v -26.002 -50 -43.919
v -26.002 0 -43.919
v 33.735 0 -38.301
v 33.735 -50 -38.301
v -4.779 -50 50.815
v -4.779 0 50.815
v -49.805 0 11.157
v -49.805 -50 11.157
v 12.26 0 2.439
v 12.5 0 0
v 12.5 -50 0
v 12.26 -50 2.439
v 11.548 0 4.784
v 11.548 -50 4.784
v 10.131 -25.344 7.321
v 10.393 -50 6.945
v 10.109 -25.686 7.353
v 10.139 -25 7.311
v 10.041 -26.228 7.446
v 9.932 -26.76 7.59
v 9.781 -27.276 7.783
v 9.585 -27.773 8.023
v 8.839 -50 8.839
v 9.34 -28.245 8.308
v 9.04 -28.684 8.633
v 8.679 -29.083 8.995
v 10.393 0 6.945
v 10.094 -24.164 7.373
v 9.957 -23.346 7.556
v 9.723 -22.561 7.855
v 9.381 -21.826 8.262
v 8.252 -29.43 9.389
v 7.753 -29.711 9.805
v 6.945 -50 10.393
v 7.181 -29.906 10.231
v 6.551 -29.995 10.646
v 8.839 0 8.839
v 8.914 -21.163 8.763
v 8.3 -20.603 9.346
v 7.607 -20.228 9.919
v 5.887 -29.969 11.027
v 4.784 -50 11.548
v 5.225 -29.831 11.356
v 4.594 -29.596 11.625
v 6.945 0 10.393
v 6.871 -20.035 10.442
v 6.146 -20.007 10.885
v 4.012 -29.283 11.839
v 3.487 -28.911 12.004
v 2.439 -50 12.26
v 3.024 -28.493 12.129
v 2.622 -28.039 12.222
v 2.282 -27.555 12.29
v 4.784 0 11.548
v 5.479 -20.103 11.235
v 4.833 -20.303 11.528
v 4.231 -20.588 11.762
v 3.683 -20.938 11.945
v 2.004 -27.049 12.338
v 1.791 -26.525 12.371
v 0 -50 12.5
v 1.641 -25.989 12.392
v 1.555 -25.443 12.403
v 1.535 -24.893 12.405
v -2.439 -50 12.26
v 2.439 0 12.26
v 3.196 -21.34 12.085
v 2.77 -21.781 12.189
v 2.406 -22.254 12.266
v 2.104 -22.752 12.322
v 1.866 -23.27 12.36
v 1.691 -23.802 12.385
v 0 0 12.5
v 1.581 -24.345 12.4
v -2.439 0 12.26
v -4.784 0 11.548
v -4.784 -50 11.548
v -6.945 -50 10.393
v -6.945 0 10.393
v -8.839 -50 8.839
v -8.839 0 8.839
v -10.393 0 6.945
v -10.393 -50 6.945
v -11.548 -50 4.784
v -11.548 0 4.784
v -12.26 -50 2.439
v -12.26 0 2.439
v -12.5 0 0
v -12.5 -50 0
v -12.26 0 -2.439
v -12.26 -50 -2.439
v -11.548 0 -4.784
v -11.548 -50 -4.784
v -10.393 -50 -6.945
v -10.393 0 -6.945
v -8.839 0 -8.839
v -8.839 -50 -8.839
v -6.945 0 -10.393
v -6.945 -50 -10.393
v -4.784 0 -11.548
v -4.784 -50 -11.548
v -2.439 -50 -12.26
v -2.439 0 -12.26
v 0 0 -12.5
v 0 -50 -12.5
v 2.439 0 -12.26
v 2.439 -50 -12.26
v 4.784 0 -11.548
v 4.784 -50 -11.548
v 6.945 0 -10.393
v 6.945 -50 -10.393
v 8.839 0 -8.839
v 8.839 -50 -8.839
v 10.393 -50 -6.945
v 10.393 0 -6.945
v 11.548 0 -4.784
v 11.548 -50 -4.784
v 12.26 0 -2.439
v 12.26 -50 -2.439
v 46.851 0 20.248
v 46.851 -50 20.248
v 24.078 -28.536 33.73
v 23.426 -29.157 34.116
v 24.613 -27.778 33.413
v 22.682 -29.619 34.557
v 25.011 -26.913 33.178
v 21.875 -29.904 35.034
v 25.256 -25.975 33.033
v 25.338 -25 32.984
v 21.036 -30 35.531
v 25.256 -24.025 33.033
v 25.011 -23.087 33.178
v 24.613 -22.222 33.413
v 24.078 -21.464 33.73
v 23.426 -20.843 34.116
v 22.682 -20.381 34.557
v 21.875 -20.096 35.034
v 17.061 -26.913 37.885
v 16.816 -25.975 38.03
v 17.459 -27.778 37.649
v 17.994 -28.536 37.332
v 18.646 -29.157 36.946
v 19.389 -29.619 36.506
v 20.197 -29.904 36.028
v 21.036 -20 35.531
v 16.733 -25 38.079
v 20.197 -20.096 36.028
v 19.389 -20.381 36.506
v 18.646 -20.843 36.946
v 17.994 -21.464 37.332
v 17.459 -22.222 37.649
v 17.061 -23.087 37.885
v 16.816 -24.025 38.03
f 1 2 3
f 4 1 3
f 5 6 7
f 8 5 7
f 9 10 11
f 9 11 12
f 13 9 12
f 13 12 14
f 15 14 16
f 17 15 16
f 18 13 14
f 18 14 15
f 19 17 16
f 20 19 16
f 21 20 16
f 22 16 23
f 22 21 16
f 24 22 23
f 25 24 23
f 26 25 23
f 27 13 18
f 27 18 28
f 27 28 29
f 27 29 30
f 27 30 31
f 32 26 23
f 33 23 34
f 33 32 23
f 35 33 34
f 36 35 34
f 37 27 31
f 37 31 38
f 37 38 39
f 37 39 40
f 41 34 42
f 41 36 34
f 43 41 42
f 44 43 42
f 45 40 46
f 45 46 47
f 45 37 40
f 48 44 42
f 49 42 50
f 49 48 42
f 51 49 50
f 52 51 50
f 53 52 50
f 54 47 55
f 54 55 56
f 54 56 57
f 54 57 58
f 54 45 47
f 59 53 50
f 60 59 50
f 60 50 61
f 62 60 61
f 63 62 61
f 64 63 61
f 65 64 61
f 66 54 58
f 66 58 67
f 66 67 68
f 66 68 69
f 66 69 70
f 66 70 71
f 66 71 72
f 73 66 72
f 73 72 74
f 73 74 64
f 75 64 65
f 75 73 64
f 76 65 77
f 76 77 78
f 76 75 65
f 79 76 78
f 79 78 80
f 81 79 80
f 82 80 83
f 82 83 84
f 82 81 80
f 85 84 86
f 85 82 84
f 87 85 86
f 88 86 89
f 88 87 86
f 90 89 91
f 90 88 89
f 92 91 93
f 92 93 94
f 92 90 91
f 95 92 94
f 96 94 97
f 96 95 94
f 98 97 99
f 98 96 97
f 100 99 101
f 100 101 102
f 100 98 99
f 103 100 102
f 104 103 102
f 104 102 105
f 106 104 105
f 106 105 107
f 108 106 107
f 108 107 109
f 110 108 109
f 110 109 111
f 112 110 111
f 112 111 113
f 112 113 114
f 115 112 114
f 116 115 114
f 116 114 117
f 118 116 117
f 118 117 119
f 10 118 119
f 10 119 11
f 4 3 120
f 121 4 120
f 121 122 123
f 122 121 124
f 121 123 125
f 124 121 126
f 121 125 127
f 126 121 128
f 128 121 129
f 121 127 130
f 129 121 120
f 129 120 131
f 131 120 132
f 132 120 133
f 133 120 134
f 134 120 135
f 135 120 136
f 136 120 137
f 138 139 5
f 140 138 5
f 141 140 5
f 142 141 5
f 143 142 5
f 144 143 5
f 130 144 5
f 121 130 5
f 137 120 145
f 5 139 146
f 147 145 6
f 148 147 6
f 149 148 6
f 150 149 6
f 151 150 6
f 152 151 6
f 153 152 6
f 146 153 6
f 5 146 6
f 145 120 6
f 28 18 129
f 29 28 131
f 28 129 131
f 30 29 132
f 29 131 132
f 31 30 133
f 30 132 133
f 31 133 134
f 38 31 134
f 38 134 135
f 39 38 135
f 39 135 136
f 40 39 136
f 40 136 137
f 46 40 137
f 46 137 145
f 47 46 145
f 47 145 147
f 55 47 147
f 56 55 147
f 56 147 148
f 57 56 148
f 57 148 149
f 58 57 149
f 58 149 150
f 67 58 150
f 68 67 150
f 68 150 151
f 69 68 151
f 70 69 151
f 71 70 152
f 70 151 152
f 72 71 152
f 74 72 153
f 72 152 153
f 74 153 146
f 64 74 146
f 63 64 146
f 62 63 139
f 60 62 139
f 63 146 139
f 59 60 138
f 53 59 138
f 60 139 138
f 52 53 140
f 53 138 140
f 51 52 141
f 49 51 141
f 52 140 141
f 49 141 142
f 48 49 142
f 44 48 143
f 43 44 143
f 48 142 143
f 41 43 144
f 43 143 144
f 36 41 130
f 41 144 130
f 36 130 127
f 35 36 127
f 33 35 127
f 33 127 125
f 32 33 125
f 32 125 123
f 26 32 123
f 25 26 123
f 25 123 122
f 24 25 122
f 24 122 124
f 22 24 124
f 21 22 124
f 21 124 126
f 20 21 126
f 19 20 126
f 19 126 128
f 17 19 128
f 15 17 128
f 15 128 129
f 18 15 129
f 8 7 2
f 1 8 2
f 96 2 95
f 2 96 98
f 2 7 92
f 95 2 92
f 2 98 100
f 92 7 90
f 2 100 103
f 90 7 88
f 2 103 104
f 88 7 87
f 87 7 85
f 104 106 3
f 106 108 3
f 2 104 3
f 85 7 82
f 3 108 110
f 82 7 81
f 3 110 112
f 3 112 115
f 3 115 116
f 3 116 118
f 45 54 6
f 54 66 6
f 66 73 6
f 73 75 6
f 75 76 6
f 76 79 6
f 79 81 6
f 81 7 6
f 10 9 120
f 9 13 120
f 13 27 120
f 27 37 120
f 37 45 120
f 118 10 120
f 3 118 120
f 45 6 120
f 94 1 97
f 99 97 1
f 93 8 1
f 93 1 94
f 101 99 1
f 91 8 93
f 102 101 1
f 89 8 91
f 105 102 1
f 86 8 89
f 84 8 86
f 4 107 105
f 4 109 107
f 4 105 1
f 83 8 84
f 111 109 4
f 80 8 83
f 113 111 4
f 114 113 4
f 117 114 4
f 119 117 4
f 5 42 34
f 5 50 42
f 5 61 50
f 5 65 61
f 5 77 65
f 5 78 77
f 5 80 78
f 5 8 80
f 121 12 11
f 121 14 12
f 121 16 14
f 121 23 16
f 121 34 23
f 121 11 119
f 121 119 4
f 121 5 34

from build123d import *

# Parameters (mm, degrees)
F0_R     = 12.5
F1_DEPTH = 50
F2_R     = 5
F3_DEPTH = 29.8360184767


with BuildPart() as f1:
    # F0 (on Front) → F1 (new body)
    with BuildSketch(Plane.XZ):
        Polygon((46.8509476544, 20.2477943437), (-4.7790577234, 50.8148116121), (-49.8045677617, 11.1574863645), (-26.0018579483, -43.9191058098), (33.7345357789, -38.3009865105), align=None)
        Circle(F0_R, mode=Mode.SUBTRACT)
    extrude(amount=F1_DEPTH)

    # F2 (on face) → F3 (cut, through all)
    with BuildSketch(Plane(origin=(21.0359449655, 0, 35.5313029779), x_dir=(0.8605000896, 0, -0.5094502878), z_dir=(0.5094502878, 0, 0.8605000896))):
        with Locations((0, -25)):
            Circle(F2_R)
    extrude(amount=-F3_DEPTH, mode=Mode.SUBTRACT)


solid = f1.part
